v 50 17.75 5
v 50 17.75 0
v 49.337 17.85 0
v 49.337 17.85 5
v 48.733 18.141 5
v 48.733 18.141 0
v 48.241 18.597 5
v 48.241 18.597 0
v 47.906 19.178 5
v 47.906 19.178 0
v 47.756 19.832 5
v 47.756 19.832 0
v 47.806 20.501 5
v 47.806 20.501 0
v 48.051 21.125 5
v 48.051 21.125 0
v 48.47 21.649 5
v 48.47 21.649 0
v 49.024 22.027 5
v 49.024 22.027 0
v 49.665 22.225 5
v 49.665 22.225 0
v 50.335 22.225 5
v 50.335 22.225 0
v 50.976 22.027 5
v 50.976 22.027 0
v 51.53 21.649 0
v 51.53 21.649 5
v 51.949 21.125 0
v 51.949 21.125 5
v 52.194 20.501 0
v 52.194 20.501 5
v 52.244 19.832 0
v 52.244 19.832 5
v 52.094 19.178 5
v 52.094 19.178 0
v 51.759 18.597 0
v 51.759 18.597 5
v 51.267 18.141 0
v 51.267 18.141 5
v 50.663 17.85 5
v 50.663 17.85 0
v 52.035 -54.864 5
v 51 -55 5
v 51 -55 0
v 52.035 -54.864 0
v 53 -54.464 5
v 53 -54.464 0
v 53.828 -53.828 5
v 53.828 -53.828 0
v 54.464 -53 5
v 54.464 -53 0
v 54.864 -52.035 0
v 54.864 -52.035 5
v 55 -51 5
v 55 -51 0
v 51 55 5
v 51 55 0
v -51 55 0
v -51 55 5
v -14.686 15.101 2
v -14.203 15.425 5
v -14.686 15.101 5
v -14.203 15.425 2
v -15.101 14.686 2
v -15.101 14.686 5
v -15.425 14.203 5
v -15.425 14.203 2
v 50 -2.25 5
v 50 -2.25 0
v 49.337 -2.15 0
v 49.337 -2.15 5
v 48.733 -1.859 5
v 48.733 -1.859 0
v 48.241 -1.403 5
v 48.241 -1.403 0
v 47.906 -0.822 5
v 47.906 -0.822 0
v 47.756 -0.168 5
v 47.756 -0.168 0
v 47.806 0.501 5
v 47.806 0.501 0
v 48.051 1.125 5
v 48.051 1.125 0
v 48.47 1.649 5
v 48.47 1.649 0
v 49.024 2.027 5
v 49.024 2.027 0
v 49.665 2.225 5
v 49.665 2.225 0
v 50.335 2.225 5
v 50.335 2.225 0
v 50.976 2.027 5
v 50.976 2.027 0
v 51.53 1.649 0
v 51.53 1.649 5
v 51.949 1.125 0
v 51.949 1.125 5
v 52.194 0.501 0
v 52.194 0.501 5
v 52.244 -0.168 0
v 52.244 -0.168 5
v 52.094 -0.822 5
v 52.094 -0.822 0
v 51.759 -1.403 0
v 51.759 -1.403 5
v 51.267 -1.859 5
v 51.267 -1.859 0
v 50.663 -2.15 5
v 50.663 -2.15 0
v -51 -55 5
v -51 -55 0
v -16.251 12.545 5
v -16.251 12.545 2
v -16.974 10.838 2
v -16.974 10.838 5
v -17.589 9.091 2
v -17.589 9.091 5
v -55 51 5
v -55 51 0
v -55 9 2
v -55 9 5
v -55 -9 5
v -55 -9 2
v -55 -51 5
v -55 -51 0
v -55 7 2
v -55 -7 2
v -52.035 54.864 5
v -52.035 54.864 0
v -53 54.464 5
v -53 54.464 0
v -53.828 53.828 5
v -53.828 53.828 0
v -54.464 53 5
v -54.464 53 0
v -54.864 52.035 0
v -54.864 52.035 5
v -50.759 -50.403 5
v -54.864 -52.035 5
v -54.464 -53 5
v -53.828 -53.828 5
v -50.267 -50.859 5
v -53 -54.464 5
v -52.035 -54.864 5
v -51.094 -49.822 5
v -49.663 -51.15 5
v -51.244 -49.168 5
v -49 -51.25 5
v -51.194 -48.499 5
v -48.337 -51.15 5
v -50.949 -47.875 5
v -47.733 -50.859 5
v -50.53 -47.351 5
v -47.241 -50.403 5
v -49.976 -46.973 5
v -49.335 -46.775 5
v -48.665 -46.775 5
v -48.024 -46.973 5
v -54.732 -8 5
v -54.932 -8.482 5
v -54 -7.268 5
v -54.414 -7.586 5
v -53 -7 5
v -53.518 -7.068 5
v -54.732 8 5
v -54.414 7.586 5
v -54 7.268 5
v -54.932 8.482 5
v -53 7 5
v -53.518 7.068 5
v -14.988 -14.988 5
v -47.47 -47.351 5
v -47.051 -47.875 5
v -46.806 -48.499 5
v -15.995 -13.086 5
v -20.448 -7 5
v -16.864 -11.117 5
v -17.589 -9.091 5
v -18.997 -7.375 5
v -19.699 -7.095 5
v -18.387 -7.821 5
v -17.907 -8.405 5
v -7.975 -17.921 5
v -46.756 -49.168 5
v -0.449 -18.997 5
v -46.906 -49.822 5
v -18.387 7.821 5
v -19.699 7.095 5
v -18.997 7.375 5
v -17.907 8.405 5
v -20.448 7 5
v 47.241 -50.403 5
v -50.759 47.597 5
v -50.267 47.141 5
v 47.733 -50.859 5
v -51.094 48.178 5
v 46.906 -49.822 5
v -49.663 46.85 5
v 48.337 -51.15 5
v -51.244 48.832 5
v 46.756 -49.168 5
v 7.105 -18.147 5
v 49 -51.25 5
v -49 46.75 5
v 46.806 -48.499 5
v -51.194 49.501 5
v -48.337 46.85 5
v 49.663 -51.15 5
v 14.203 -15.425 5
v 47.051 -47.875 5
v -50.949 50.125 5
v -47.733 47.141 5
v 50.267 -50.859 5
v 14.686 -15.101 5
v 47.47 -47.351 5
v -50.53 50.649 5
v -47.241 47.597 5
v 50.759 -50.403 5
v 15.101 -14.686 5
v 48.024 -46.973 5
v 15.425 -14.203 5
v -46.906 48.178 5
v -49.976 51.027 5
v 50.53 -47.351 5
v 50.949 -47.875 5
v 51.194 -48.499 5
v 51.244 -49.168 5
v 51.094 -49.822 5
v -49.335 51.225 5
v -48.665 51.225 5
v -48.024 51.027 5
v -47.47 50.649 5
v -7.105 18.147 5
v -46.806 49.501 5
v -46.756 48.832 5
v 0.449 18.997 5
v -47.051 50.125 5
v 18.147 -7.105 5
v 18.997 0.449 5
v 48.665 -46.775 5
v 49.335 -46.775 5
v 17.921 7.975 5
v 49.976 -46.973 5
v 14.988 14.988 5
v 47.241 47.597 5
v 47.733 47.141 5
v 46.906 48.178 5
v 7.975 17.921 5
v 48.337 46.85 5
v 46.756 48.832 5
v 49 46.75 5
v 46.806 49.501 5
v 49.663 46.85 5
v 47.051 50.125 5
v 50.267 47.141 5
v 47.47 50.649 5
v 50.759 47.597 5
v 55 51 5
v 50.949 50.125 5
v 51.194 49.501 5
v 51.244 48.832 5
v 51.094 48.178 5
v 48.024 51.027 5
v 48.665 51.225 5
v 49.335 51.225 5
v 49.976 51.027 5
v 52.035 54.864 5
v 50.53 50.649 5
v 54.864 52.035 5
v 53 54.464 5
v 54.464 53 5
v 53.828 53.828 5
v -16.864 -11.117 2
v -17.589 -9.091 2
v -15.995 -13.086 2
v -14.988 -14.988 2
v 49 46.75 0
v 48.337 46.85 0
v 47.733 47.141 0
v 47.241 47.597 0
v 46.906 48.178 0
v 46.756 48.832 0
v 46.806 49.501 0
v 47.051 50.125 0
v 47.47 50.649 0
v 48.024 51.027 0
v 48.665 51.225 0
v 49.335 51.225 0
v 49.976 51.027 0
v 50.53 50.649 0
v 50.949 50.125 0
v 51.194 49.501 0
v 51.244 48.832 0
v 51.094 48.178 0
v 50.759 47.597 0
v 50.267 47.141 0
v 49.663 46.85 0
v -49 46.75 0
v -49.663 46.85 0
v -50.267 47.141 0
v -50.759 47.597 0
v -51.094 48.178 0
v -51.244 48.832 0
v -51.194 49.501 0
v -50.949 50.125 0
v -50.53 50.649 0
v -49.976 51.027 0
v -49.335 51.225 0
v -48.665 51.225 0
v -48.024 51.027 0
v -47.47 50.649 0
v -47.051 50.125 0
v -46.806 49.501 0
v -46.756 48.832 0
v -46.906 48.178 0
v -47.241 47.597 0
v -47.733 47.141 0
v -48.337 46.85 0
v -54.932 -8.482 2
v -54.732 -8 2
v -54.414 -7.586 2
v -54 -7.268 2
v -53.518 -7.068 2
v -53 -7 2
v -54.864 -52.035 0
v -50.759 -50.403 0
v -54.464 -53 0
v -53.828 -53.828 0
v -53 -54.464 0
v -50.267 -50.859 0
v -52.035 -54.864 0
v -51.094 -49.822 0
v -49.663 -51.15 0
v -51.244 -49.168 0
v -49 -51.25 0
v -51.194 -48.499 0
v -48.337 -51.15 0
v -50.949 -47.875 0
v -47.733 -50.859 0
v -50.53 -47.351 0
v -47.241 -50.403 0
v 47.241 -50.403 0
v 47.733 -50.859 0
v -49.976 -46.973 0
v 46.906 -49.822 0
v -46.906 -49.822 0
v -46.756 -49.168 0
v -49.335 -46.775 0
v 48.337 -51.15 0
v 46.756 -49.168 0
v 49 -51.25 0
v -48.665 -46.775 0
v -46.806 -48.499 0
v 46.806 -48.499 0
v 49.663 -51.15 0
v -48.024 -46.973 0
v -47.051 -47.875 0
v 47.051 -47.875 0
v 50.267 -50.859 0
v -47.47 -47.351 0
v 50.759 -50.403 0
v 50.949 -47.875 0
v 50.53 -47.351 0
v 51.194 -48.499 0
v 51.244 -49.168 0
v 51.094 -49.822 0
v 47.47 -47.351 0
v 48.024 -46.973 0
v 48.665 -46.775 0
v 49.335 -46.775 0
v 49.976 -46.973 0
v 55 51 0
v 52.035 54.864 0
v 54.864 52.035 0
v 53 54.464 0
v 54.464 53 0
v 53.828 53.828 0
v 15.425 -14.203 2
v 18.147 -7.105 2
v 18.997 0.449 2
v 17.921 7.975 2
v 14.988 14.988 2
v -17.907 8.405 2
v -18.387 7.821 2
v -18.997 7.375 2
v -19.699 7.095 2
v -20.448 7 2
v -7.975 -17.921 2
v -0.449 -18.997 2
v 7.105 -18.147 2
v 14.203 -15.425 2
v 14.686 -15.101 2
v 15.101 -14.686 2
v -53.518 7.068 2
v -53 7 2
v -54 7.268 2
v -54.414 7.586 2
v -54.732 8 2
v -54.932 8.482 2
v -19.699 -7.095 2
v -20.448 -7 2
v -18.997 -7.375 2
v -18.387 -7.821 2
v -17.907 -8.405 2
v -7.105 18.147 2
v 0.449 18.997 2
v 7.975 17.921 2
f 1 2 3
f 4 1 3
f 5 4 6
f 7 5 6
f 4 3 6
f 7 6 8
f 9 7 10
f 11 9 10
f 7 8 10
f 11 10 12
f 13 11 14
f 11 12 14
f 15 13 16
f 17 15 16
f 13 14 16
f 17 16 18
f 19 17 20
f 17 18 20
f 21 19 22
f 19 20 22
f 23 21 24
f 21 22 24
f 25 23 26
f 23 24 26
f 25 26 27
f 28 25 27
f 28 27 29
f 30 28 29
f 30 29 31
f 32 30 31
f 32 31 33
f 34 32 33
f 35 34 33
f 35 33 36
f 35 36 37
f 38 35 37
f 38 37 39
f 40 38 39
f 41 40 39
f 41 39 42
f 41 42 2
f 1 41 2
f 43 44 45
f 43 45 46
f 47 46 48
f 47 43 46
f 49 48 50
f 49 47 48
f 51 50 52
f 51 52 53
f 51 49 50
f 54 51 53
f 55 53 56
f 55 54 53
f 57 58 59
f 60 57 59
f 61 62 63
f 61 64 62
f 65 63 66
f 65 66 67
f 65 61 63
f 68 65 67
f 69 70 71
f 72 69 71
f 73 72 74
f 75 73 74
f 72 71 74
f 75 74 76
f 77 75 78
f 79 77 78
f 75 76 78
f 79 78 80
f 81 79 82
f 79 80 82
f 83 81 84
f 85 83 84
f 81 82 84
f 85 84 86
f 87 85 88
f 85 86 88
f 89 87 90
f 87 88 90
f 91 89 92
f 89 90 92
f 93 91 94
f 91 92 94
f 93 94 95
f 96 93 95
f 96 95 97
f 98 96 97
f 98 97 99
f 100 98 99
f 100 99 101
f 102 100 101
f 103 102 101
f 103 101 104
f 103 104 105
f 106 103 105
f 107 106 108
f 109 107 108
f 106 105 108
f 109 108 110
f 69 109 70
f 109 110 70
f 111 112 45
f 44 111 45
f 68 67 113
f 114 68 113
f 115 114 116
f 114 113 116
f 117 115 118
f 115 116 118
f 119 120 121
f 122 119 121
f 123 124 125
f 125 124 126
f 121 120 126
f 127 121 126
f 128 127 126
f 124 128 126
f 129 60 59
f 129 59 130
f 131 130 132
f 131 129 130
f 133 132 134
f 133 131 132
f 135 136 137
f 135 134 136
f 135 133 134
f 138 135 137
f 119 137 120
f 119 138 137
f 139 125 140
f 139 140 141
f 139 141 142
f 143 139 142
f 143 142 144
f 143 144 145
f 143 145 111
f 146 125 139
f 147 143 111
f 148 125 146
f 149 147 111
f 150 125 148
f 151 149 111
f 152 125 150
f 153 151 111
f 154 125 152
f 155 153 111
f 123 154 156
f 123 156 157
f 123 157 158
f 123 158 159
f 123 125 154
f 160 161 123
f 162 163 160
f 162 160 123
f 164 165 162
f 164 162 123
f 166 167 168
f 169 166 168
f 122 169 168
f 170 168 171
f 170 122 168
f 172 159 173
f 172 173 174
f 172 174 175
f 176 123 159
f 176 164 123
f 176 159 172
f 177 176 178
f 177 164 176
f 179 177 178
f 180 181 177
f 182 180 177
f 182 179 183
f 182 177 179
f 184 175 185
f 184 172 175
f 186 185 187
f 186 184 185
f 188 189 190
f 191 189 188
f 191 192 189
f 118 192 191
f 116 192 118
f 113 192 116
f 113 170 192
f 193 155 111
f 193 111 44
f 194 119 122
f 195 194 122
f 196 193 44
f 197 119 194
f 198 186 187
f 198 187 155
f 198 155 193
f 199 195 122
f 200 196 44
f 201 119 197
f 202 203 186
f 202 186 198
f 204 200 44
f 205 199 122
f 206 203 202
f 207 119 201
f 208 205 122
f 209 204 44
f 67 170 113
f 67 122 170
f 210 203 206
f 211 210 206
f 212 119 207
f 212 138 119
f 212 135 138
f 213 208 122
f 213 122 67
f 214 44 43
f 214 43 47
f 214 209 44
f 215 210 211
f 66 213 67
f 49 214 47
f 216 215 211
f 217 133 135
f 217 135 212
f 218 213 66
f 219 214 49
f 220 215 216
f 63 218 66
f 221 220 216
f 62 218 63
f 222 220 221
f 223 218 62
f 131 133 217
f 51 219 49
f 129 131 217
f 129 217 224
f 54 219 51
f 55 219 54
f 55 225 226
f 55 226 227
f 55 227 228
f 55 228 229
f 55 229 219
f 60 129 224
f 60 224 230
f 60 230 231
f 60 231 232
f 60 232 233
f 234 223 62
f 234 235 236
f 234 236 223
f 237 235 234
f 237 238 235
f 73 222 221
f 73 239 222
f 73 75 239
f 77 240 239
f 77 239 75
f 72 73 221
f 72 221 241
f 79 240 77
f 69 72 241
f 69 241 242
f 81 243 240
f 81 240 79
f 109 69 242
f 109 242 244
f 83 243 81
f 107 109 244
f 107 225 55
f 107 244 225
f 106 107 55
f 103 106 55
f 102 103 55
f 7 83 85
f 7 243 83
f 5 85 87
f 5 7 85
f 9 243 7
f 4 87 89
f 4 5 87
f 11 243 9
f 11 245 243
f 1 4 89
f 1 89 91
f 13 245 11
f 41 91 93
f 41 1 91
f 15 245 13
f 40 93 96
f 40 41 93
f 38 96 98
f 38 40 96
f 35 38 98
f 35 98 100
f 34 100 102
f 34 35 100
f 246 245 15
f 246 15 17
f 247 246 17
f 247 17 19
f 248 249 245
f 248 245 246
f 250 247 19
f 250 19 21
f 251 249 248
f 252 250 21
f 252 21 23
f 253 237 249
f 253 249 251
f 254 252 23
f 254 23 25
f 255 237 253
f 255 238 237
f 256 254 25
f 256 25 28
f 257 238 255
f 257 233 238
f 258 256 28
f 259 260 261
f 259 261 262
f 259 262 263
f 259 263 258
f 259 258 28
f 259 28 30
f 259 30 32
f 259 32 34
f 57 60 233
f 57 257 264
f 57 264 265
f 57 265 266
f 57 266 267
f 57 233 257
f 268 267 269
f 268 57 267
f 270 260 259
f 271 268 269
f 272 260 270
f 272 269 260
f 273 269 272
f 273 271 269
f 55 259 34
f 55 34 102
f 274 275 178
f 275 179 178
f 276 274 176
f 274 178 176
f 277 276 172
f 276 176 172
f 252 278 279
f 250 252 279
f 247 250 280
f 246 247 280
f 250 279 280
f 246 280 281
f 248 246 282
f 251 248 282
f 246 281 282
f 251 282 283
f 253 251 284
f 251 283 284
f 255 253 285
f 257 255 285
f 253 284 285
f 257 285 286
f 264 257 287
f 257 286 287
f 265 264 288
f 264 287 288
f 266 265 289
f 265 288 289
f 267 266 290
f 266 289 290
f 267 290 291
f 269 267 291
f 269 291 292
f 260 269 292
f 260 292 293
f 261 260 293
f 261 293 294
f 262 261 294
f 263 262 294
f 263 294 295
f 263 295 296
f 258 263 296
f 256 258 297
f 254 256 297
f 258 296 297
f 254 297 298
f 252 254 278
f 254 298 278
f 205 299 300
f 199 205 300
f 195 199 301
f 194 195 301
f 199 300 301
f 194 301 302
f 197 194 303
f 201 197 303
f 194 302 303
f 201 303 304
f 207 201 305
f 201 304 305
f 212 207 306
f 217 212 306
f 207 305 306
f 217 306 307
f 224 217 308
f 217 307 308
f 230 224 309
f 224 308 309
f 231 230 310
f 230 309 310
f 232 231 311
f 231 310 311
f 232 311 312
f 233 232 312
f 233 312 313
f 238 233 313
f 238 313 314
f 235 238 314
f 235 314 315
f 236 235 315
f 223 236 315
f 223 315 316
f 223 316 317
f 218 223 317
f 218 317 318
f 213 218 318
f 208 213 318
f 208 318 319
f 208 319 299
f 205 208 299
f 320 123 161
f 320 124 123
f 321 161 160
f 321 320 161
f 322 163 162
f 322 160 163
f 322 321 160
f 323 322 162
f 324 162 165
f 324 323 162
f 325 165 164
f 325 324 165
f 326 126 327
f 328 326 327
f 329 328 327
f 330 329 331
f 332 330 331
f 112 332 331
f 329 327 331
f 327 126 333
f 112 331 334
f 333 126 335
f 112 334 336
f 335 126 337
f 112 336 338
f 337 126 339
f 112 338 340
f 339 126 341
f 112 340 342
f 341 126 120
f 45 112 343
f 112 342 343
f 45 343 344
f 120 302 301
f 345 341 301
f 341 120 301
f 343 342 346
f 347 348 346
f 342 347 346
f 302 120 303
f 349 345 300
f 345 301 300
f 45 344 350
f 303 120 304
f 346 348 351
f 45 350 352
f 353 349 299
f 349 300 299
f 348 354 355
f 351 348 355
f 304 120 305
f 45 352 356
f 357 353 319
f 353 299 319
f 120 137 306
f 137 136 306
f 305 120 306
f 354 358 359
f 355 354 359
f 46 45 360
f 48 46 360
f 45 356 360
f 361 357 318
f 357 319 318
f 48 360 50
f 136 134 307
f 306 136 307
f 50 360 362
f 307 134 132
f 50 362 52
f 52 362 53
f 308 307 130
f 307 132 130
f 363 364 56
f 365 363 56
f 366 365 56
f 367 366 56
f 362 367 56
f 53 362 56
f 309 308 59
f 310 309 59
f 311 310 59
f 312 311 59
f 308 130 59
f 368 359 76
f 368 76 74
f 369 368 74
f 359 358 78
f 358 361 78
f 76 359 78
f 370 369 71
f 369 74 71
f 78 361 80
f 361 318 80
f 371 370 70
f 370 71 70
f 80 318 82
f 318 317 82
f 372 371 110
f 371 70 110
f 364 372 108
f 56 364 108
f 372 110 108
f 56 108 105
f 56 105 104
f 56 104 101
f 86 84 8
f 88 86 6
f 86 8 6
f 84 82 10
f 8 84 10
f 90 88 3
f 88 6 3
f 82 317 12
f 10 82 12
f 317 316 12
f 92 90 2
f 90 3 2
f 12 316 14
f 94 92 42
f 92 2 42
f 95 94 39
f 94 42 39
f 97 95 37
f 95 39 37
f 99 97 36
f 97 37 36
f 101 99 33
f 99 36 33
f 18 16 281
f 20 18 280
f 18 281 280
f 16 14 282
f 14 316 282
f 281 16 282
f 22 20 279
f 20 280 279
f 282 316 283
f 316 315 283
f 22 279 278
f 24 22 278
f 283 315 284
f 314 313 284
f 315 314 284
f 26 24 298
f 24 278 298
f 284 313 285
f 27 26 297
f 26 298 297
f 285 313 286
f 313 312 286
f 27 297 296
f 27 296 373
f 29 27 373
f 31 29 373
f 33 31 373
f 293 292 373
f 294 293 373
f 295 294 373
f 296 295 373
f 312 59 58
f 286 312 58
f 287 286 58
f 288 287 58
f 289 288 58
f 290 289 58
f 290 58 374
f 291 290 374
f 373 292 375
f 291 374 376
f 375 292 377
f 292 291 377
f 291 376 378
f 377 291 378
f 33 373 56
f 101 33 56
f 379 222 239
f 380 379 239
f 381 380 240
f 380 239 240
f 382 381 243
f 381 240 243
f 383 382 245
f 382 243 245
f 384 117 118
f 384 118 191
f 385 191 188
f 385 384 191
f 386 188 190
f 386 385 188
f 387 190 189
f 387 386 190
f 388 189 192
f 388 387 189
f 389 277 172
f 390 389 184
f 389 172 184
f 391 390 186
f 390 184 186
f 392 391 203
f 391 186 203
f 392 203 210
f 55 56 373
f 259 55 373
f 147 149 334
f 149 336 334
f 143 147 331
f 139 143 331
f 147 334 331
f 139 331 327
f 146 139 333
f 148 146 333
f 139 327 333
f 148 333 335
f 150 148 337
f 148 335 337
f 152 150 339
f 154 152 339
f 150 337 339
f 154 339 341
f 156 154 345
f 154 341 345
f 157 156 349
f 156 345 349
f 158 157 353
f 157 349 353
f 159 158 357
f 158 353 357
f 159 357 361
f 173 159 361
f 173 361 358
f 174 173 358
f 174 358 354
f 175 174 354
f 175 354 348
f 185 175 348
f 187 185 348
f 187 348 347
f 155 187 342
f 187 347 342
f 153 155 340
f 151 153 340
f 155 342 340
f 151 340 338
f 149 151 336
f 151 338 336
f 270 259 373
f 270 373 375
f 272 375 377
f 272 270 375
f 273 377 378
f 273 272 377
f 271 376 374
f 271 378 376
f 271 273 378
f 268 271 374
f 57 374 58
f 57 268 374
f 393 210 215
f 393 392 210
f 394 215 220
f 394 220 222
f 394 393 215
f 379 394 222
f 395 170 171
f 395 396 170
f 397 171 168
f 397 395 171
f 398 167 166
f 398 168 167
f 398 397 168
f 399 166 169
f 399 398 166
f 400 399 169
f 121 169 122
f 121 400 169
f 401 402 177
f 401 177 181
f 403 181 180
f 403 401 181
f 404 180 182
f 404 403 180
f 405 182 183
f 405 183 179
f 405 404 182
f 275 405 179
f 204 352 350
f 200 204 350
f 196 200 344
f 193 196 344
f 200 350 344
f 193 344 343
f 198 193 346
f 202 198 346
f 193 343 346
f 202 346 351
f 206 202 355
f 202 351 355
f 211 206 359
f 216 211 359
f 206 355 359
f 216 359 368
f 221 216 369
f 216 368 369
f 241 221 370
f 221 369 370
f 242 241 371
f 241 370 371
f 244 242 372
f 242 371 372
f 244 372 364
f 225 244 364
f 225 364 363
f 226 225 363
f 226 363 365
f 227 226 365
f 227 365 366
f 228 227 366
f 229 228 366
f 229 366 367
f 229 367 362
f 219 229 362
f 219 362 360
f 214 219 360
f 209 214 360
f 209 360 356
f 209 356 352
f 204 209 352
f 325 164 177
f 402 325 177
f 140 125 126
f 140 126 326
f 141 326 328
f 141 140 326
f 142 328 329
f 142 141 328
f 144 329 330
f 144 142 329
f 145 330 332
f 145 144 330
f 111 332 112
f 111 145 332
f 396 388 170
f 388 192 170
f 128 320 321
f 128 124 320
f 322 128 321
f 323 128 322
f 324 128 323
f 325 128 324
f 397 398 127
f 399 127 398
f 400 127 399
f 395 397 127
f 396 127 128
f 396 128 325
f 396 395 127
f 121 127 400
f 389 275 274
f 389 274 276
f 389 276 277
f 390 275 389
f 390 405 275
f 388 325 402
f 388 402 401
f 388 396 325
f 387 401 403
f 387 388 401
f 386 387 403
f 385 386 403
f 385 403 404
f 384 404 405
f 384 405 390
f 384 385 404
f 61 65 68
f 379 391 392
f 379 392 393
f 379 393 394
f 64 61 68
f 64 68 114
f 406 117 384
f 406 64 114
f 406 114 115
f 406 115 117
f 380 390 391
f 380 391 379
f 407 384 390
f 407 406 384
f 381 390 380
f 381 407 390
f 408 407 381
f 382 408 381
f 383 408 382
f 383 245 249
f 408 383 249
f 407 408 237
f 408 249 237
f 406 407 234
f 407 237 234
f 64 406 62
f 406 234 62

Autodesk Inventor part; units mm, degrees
ref_plane "YZ Plane" through (0, 0, 0) normal (1, 0, 0) x (0, 1, 0)
ref_plane "XZ Plane" through (0, 0, 0) normal (0, 1, 0) x (-1, 0, 0)
ref_plane "XY Plane" through (0, 0, 0) normal (0, 0, 1) x (1, 0, 0)
sketch "Sketch1" plane through (0, 0, 0) normal (0, 0, 1) x (1, 0, 0)
  line L0 (-55, -55) -> (55, -55)
  line L1 (55, -55) -> (55, 55)
  line L2 (55, 55) -> (-55, 55)
  line L3 (-55, 55) -> (-55, -55)
  line L4 (-55, -55) -> (55, 55) construction
  line L5 (55, -55) -> (-55, 55) construction
  point P0 (0, 0)
  dimension "d0" = 110
  dimension "d1" = 110
extrude "Extrusion1" add sketch "Sketch1" along normal blind 5
sketch "Sketch2" plane through (0, 0, 5) normal (0, 0, 1) x (1, 0, 0)
  point P0 (0, 0)
  point P1 (-49, 49)
  point P2 (49, 49)
  point P3 (-49, -49)
  point P4 (49, -49)
  dimension "d11" = 98
  dimension "d12" = 98
  dimension "d13" = 49
  dimension "d14" = 49
hole "Hole1" at (-49, 49, 5) at (49, 49, 5) at (-49, -49, 5) at (49, -49, 5) direction (0, 0, -1) diameter 4.5 depth 8.8 tip angle 118 clearance for "Flat Head Machine Screw" size "M4" standard "Ansi Metric M Profile"
fillet "Fillet1" radius 4 4 edges at (55, 55, 2.5) (55, -55, 2.5) (-55, -55, 2.5) (-55, 55, 2.5)
sketch "Sketch3" plane through (0, 0, 5) normal (0, 0, 1) x (1, 0, 0)
  line L0 (-6.1969, -19) -> (-19, -19)
  line L1 (-19, -19) -> (-19, 19)
  line L2 (-19, 19) -> (19, 19)
  line L3 (19, 19) -> (-6.1969, -19)
  line L4 (-6.1969, -19) -> (-19, 19) construction
  line L5 (-19, -19) -> (19, 19) construction
  line L6 (-55, 51) -> (-55, -51) projected
  arc A0 (-12.2164, 19) -> (-12.2164, -19) centre (11, 0) ccw
  arc A1 (-19, -12.2164) -> (19, -12.2164) centre (0, 11) ccw
  arc A2 (12.2164, -19) -> (12.2164, 19) centre (-11, 0) ccw
  arc A3 (19, 12.2164) -> (-19, 12.2164) centre (0, -11) ccw
  line L7 (-19, -7) -> (-19, 7)
  line L8 (-91.8281, -7) -> (-18.1719, -7)
  line L9 (-18.1719, -7) -> (-18.1719, 7)
  line L10 (-18.1719, 7) -> (-91.8281, 7)
  line L11 (-91.8281, 7) -> (-91.8281, -7)
  line L12 (-91.8281, -7) -> (-18.1719, 7) construction
  line L13 (-18.1719, -7) -> (-91.8281, 7) construction
  point P0 (0, 0)
  point P1 (0, 0)
  point P2 (-19, 0)
  point P3 (0, -19)
  point P4 (19, 0)
  point P5 (0, 19)
  point P6 (-15.2369, 15.7631)
  point P7 (-14.9878, 14.9878)
  point P8 (-46.7631, -15.7631)
  point P9 (14.9878, -14.9878)
  point P10 (-14.9878, -14.9878)
  point P11 (14.9878, 14.9878)
  point P12 (-55, 0)
  point P13 (-55, 7)
  point P14 (-55, -7)
  point P15 (-18.1719, -7)
  dimension "d18" = 38
  dimension "d19" = 38
  dimension "d20" = 30
  dimension "d23" = 360
  dimension "d28" = 42.3919
  dimension "d30" = 14
extrude "Extrusion2" cut sketch "Sketch3" against normal blind 3 contours A1 A0 L9 A3 A2 L3 | L3 A2 A1 | L8 L1 A0 | A0 L9 | L8 L6 L10 L1 | L1 L10 A0
fillet "Fillet2" radius 3 4 edges at (14.9878, -14.9878, 3.5) (-14.9878, 14.9878, 3.5) (-18.1719, -7, 3.5) (-18.1719, 7, 3.5)
sketch "Sketch4" plane through (0, 0, 5) normal (0, 0, 1) x (1, 0, 0)
  line L0 (55, -51) -> (55, 51) construction
  line L1 (50, 20) -> (50, 0) construction
  point P0 (0, 0)
  point P1 (55, 0)
  point P2 (50, 10)
  dimension "d40" = 20
  dimension "d43" = 10
  dimension "d44" = 5
hole "Hole2" at (50, 20, 5) at (50, 0, 5) direction (0, 0, -1) diameter 4.5 depth 14.2 tip angle 118 clearance for "Countersunk Flat Head Screw ISO 2009/7046" size "M4" standard "ISO"
fillet "Fillet3" radius 2 2 edges at (-55, -7, 3.5) (-55, 7, 3.5)
equation "\"d0\" = pcb_size"
equation "\"d1\" = pcb_size"
equation "\"d11\" = pcb_fixation_ecart"
equation "\"d12\" = d11"
equation "\"d13\" = 0.5 * d12"
equation "\"d14\" = 0.5 * d11"
equation "\"pcb_size\" = 110"
equation "\"pcb_fixation_ecart\" = 98"
properties part number "support_camera"
